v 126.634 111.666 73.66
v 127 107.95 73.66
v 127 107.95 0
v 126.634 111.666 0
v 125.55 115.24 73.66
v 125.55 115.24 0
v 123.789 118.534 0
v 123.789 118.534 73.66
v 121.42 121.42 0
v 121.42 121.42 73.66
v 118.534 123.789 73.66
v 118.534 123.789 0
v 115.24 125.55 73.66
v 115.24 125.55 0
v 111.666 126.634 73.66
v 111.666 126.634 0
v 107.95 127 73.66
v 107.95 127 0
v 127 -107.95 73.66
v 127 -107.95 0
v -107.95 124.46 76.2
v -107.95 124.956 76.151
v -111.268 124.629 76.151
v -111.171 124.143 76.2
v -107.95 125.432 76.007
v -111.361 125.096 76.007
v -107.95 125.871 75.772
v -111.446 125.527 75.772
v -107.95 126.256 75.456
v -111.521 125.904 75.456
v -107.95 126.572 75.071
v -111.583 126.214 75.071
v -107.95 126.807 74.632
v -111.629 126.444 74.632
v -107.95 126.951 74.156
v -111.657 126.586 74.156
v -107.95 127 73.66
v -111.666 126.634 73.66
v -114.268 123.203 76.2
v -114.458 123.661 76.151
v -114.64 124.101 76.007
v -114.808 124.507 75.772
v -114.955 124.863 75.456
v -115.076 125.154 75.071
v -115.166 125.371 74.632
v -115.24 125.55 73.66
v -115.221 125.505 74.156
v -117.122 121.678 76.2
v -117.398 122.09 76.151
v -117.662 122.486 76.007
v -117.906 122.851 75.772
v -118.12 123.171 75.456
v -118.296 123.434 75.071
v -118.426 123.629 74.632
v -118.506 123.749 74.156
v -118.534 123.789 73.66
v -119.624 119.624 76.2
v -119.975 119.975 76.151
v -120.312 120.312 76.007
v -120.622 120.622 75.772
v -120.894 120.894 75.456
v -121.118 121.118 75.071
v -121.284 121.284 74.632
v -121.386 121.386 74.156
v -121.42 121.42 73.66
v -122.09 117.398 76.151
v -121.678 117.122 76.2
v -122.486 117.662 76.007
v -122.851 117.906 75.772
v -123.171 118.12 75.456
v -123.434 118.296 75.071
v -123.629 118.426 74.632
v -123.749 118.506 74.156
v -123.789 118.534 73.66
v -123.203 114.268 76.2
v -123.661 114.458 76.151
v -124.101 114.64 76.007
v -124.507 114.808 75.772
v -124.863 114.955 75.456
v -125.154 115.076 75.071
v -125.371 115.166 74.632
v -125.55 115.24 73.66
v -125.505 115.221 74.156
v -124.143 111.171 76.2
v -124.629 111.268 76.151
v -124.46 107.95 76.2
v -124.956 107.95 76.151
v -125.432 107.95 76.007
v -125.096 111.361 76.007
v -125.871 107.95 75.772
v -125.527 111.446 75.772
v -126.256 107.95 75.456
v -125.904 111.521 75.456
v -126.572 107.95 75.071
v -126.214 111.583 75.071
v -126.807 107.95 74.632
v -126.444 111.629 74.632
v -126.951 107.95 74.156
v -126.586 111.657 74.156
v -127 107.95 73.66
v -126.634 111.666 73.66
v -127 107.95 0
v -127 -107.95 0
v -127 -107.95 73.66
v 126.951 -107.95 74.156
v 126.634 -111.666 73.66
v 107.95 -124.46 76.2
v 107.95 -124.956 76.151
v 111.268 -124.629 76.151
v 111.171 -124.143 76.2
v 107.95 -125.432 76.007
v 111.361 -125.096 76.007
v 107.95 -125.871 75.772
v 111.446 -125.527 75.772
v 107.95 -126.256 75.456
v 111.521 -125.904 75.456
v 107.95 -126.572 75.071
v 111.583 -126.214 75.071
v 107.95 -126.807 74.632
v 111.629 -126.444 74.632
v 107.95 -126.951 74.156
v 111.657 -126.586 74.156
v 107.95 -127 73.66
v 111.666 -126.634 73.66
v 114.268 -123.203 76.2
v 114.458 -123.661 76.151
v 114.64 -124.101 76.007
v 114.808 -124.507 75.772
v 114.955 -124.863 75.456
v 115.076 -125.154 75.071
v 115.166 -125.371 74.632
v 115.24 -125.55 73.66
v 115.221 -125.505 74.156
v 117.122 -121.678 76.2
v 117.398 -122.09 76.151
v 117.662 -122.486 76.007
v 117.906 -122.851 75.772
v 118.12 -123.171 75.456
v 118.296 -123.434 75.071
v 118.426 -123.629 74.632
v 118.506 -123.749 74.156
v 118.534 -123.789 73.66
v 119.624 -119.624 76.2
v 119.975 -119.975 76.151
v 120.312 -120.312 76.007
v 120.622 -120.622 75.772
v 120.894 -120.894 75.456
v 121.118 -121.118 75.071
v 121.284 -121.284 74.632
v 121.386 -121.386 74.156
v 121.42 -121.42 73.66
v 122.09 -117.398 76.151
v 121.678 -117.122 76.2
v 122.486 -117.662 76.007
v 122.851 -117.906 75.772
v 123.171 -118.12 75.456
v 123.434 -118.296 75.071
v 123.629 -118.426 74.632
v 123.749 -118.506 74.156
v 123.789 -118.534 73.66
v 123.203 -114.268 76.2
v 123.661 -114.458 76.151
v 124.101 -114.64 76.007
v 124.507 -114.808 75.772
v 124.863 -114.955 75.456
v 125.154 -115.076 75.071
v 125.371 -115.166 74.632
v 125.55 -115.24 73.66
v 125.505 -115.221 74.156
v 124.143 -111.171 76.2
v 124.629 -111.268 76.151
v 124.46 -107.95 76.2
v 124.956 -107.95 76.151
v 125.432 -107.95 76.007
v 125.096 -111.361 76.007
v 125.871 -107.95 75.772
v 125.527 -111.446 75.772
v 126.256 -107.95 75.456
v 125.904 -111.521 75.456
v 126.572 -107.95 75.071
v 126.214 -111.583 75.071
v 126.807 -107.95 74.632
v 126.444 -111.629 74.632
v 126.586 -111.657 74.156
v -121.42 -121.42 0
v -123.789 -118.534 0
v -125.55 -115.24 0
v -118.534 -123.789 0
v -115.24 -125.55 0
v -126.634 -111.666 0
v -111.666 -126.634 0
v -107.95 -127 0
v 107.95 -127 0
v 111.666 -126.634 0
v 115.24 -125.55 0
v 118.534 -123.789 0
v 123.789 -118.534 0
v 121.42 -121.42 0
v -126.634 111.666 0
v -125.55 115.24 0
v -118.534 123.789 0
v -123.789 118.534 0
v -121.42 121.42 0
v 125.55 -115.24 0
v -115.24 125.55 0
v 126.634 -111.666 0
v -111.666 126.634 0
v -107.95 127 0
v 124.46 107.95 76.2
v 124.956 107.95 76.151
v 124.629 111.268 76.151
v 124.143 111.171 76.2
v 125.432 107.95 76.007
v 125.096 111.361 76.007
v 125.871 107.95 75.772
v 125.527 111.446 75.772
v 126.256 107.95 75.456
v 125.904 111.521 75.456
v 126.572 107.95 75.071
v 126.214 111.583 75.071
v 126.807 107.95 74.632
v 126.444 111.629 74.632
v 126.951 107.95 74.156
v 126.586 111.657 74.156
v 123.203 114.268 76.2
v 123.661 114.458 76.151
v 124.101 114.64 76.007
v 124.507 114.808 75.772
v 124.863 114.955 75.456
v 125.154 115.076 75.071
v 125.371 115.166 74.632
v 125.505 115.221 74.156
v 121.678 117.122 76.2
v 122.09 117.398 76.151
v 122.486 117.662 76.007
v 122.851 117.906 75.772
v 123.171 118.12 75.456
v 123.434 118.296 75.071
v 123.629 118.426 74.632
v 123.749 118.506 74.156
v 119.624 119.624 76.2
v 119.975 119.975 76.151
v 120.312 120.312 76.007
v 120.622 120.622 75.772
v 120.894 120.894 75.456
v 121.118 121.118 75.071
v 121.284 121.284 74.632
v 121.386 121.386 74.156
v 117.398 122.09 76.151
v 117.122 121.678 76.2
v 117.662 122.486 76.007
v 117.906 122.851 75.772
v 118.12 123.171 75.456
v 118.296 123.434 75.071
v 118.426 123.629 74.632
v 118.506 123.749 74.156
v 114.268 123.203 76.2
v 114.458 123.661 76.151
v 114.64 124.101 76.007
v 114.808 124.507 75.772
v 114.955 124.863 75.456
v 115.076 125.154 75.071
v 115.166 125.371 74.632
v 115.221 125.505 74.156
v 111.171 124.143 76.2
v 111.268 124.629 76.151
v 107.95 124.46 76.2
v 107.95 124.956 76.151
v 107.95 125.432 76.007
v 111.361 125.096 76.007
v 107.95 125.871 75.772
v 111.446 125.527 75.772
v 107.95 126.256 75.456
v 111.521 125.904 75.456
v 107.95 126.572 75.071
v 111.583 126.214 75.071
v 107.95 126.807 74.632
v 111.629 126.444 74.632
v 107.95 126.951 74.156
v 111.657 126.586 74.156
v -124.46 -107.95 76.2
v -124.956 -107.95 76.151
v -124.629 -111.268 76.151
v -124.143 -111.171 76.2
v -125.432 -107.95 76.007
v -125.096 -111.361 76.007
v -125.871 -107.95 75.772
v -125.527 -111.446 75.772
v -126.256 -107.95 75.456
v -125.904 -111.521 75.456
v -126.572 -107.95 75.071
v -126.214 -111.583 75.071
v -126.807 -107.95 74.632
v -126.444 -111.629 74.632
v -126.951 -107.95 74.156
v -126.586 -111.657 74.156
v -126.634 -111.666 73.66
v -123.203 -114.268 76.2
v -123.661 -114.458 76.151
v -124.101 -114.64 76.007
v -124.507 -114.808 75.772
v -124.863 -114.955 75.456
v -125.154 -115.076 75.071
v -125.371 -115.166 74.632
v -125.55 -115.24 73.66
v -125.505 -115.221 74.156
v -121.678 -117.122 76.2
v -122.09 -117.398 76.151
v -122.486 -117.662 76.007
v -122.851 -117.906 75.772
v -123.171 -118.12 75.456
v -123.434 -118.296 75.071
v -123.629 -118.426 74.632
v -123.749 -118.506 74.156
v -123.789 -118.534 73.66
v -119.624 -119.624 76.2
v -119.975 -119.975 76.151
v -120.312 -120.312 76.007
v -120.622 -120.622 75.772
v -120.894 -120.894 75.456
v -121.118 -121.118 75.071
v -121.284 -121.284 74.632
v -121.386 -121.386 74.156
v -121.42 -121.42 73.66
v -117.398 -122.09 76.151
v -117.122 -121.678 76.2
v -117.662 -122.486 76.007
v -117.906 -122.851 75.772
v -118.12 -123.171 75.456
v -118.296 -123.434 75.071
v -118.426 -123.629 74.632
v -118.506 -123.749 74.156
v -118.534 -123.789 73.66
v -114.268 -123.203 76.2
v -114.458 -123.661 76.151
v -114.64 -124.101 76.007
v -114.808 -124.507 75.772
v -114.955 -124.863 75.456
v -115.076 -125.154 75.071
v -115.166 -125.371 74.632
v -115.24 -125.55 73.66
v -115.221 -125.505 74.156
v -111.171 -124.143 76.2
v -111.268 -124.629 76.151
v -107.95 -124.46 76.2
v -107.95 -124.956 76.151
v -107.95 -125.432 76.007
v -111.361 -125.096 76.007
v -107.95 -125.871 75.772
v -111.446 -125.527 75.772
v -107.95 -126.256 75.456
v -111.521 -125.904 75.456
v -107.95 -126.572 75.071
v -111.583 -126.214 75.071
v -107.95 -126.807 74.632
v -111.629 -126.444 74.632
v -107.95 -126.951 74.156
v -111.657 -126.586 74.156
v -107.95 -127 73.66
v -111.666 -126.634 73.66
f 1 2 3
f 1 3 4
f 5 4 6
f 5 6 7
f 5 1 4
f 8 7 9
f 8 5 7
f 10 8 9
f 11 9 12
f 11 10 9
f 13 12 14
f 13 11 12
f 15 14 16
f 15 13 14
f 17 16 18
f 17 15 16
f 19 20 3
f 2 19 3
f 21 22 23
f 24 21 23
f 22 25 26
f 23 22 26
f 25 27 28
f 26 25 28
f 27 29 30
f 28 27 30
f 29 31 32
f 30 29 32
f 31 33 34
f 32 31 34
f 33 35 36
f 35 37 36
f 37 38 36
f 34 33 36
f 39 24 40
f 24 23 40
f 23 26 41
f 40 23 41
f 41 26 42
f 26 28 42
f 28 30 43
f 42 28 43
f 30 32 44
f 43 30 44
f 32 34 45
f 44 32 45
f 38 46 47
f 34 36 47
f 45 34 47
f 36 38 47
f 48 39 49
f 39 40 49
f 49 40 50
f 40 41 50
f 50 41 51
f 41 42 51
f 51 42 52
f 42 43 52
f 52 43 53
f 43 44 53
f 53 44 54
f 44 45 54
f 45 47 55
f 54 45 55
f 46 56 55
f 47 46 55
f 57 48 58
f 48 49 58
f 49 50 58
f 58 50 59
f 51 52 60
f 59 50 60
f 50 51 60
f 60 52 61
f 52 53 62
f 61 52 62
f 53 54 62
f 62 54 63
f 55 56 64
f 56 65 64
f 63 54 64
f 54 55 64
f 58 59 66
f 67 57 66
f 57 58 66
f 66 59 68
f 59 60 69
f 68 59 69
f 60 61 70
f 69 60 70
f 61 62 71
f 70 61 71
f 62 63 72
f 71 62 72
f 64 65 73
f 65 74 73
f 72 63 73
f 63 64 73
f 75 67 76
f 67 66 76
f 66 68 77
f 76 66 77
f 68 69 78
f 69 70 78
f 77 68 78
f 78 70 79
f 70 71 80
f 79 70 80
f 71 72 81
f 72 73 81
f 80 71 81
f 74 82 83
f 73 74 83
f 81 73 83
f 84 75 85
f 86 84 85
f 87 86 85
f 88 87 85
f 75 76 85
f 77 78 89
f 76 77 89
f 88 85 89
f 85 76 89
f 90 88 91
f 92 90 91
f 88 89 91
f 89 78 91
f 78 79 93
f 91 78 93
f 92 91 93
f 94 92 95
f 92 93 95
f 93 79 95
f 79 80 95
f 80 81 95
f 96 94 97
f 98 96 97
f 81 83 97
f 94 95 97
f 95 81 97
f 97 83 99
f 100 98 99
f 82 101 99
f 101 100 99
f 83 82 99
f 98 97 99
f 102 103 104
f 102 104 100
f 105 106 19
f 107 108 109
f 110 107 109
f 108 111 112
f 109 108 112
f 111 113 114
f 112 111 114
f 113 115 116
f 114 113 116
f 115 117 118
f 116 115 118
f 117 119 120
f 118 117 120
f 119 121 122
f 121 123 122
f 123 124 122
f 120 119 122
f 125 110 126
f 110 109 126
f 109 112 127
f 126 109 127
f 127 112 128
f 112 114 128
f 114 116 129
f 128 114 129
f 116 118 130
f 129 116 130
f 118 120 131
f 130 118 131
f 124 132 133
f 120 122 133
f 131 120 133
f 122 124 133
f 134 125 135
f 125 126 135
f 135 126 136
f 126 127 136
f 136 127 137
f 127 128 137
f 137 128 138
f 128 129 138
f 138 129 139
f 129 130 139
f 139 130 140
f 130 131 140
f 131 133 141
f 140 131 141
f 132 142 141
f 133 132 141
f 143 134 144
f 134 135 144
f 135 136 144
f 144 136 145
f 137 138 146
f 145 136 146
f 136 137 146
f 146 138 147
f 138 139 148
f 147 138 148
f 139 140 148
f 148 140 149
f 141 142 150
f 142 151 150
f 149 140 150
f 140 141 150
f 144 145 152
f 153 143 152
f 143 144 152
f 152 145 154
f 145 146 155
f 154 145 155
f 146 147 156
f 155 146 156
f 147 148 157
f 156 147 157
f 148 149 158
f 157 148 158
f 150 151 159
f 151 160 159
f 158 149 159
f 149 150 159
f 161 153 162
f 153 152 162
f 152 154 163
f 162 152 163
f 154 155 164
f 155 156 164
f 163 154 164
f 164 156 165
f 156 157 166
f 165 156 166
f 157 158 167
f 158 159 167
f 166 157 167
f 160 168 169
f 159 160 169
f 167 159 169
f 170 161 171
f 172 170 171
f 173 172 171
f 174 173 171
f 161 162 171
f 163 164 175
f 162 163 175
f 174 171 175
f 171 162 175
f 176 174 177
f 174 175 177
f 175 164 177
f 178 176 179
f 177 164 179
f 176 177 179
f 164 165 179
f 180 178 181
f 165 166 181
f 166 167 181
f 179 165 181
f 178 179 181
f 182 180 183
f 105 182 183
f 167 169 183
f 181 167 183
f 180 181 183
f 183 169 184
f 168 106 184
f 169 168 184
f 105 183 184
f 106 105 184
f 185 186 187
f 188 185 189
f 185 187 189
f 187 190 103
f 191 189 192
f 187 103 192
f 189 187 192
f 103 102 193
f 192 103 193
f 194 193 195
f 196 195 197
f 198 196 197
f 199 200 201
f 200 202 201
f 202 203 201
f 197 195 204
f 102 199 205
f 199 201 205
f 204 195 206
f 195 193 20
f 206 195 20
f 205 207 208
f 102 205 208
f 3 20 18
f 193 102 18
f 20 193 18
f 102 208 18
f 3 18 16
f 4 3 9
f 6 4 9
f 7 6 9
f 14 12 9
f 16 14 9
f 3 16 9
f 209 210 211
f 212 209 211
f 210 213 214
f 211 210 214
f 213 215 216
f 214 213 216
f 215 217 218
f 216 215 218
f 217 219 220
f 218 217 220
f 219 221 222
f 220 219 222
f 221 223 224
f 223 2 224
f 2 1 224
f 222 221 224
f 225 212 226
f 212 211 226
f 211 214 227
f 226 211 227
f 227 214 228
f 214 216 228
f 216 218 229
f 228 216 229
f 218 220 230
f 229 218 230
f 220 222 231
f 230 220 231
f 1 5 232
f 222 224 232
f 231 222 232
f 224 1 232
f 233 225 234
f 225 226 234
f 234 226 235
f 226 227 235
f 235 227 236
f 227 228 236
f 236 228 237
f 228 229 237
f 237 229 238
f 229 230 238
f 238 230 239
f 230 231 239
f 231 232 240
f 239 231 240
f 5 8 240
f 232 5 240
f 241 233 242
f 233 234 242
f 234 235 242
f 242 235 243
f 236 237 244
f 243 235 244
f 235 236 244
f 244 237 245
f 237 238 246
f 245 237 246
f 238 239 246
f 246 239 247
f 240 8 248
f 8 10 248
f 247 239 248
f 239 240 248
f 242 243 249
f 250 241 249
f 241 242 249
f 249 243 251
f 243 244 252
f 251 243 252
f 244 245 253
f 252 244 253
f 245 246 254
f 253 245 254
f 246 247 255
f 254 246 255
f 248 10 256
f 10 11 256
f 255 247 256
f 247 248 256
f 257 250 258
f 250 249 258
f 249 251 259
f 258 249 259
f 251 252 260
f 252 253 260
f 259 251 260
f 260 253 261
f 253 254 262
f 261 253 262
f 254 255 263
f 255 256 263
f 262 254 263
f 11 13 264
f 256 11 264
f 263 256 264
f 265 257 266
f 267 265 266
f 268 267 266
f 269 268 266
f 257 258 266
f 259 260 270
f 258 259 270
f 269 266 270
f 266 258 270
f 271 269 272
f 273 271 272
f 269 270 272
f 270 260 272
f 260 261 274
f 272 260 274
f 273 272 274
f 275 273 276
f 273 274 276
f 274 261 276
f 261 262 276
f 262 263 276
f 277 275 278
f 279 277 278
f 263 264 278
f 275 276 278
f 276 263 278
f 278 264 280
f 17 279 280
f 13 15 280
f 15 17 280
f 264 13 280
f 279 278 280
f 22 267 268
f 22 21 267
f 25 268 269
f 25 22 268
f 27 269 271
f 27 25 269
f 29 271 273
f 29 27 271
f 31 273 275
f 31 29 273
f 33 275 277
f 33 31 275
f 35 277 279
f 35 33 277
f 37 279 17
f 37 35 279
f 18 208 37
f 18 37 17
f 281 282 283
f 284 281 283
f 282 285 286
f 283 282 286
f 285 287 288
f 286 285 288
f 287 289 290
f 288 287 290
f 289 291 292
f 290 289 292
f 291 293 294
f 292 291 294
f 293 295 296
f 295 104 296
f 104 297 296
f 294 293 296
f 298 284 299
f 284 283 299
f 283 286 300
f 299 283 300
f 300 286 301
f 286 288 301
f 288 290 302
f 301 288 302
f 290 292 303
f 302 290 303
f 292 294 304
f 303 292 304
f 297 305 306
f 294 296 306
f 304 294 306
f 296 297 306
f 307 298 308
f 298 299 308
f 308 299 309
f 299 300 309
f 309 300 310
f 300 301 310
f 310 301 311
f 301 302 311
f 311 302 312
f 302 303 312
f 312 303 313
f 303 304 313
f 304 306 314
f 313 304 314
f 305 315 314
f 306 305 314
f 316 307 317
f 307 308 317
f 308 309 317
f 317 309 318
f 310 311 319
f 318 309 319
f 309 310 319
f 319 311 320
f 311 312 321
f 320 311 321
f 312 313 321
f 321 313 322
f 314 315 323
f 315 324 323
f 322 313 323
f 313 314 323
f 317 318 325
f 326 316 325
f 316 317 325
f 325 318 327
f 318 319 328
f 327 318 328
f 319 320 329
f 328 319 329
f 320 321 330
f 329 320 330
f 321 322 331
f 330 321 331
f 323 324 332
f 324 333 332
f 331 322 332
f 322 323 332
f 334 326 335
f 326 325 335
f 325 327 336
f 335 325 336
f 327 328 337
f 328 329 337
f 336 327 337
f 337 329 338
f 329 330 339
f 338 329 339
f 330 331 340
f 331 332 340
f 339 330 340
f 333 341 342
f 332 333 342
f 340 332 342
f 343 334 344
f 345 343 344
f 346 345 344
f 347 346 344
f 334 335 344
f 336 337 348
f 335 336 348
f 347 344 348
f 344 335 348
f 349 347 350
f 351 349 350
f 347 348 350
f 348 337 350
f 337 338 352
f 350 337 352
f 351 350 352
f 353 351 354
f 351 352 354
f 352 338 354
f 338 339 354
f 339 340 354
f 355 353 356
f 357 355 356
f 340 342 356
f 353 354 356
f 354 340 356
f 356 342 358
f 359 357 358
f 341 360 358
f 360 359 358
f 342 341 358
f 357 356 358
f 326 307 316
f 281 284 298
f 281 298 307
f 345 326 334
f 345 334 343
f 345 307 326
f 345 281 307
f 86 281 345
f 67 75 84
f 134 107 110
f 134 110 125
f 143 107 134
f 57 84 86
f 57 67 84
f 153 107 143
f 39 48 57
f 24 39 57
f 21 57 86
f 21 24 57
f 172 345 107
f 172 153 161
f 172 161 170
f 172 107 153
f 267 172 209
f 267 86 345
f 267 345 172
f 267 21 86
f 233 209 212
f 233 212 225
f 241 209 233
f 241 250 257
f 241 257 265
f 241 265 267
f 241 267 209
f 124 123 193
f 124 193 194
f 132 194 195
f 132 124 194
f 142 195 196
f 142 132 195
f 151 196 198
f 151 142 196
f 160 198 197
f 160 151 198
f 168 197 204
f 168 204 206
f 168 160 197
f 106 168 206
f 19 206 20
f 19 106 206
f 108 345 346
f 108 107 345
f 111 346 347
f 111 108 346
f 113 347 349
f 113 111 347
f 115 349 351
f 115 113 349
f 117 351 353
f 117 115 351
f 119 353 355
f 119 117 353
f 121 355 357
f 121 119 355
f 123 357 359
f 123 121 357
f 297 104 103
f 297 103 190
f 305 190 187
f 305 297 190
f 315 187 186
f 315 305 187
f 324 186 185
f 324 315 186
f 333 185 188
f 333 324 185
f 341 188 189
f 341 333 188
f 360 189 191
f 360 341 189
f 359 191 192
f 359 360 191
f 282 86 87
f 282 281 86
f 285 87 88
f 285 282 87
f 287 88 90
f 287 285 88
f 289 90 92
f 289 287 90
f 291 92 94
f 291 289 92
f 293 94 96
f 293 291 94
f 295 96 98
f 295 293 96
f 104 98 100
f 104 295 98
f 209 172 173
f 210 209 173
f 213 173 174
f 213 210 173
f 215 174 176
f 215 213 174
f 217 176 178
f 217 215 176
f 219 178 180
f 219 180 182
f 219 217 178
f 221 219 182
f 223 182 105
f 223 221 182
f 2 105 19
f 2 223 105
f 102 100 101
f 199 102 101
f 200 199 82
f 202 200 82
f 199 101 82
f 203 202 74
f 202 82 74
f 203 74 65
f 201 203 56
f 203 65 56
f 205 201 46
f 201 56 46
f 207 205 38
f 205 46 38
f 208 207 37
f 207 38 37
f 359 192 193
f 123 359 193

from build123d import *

# Parameters (mm, degrees)
F0_W     = 254
F0_H     = 254
F1_DEPTH = 76.2
F2_R     = 19.05
F3_R     = 2.54


with BuildPart() as f1:
    # F0 (on Top) → F1 (new body)
    with BuildSketch(Plane.XY):
        Rectangle(F0_W, F0_H)
    extrude(amount=F1_DEPTH)

    # F2
    f2_edges = [f1.edges().sort_by_distance(p)[0] for p in [
        (127, -127, 38.1),
        (127, 127, 38.1),
        (-127, 127, 38.1),
        (-127, -127, 38.1),
    ]]
    fillet(f2_edges, radius=F2_R)

    # F3
    f3_edges = [f1.edges().sort_by_distance(p)[0] for p in [
        (127, 0, 76.2),
    ]]
    fillet(f3_edges, radius=F3_R)


solid = f1.part
